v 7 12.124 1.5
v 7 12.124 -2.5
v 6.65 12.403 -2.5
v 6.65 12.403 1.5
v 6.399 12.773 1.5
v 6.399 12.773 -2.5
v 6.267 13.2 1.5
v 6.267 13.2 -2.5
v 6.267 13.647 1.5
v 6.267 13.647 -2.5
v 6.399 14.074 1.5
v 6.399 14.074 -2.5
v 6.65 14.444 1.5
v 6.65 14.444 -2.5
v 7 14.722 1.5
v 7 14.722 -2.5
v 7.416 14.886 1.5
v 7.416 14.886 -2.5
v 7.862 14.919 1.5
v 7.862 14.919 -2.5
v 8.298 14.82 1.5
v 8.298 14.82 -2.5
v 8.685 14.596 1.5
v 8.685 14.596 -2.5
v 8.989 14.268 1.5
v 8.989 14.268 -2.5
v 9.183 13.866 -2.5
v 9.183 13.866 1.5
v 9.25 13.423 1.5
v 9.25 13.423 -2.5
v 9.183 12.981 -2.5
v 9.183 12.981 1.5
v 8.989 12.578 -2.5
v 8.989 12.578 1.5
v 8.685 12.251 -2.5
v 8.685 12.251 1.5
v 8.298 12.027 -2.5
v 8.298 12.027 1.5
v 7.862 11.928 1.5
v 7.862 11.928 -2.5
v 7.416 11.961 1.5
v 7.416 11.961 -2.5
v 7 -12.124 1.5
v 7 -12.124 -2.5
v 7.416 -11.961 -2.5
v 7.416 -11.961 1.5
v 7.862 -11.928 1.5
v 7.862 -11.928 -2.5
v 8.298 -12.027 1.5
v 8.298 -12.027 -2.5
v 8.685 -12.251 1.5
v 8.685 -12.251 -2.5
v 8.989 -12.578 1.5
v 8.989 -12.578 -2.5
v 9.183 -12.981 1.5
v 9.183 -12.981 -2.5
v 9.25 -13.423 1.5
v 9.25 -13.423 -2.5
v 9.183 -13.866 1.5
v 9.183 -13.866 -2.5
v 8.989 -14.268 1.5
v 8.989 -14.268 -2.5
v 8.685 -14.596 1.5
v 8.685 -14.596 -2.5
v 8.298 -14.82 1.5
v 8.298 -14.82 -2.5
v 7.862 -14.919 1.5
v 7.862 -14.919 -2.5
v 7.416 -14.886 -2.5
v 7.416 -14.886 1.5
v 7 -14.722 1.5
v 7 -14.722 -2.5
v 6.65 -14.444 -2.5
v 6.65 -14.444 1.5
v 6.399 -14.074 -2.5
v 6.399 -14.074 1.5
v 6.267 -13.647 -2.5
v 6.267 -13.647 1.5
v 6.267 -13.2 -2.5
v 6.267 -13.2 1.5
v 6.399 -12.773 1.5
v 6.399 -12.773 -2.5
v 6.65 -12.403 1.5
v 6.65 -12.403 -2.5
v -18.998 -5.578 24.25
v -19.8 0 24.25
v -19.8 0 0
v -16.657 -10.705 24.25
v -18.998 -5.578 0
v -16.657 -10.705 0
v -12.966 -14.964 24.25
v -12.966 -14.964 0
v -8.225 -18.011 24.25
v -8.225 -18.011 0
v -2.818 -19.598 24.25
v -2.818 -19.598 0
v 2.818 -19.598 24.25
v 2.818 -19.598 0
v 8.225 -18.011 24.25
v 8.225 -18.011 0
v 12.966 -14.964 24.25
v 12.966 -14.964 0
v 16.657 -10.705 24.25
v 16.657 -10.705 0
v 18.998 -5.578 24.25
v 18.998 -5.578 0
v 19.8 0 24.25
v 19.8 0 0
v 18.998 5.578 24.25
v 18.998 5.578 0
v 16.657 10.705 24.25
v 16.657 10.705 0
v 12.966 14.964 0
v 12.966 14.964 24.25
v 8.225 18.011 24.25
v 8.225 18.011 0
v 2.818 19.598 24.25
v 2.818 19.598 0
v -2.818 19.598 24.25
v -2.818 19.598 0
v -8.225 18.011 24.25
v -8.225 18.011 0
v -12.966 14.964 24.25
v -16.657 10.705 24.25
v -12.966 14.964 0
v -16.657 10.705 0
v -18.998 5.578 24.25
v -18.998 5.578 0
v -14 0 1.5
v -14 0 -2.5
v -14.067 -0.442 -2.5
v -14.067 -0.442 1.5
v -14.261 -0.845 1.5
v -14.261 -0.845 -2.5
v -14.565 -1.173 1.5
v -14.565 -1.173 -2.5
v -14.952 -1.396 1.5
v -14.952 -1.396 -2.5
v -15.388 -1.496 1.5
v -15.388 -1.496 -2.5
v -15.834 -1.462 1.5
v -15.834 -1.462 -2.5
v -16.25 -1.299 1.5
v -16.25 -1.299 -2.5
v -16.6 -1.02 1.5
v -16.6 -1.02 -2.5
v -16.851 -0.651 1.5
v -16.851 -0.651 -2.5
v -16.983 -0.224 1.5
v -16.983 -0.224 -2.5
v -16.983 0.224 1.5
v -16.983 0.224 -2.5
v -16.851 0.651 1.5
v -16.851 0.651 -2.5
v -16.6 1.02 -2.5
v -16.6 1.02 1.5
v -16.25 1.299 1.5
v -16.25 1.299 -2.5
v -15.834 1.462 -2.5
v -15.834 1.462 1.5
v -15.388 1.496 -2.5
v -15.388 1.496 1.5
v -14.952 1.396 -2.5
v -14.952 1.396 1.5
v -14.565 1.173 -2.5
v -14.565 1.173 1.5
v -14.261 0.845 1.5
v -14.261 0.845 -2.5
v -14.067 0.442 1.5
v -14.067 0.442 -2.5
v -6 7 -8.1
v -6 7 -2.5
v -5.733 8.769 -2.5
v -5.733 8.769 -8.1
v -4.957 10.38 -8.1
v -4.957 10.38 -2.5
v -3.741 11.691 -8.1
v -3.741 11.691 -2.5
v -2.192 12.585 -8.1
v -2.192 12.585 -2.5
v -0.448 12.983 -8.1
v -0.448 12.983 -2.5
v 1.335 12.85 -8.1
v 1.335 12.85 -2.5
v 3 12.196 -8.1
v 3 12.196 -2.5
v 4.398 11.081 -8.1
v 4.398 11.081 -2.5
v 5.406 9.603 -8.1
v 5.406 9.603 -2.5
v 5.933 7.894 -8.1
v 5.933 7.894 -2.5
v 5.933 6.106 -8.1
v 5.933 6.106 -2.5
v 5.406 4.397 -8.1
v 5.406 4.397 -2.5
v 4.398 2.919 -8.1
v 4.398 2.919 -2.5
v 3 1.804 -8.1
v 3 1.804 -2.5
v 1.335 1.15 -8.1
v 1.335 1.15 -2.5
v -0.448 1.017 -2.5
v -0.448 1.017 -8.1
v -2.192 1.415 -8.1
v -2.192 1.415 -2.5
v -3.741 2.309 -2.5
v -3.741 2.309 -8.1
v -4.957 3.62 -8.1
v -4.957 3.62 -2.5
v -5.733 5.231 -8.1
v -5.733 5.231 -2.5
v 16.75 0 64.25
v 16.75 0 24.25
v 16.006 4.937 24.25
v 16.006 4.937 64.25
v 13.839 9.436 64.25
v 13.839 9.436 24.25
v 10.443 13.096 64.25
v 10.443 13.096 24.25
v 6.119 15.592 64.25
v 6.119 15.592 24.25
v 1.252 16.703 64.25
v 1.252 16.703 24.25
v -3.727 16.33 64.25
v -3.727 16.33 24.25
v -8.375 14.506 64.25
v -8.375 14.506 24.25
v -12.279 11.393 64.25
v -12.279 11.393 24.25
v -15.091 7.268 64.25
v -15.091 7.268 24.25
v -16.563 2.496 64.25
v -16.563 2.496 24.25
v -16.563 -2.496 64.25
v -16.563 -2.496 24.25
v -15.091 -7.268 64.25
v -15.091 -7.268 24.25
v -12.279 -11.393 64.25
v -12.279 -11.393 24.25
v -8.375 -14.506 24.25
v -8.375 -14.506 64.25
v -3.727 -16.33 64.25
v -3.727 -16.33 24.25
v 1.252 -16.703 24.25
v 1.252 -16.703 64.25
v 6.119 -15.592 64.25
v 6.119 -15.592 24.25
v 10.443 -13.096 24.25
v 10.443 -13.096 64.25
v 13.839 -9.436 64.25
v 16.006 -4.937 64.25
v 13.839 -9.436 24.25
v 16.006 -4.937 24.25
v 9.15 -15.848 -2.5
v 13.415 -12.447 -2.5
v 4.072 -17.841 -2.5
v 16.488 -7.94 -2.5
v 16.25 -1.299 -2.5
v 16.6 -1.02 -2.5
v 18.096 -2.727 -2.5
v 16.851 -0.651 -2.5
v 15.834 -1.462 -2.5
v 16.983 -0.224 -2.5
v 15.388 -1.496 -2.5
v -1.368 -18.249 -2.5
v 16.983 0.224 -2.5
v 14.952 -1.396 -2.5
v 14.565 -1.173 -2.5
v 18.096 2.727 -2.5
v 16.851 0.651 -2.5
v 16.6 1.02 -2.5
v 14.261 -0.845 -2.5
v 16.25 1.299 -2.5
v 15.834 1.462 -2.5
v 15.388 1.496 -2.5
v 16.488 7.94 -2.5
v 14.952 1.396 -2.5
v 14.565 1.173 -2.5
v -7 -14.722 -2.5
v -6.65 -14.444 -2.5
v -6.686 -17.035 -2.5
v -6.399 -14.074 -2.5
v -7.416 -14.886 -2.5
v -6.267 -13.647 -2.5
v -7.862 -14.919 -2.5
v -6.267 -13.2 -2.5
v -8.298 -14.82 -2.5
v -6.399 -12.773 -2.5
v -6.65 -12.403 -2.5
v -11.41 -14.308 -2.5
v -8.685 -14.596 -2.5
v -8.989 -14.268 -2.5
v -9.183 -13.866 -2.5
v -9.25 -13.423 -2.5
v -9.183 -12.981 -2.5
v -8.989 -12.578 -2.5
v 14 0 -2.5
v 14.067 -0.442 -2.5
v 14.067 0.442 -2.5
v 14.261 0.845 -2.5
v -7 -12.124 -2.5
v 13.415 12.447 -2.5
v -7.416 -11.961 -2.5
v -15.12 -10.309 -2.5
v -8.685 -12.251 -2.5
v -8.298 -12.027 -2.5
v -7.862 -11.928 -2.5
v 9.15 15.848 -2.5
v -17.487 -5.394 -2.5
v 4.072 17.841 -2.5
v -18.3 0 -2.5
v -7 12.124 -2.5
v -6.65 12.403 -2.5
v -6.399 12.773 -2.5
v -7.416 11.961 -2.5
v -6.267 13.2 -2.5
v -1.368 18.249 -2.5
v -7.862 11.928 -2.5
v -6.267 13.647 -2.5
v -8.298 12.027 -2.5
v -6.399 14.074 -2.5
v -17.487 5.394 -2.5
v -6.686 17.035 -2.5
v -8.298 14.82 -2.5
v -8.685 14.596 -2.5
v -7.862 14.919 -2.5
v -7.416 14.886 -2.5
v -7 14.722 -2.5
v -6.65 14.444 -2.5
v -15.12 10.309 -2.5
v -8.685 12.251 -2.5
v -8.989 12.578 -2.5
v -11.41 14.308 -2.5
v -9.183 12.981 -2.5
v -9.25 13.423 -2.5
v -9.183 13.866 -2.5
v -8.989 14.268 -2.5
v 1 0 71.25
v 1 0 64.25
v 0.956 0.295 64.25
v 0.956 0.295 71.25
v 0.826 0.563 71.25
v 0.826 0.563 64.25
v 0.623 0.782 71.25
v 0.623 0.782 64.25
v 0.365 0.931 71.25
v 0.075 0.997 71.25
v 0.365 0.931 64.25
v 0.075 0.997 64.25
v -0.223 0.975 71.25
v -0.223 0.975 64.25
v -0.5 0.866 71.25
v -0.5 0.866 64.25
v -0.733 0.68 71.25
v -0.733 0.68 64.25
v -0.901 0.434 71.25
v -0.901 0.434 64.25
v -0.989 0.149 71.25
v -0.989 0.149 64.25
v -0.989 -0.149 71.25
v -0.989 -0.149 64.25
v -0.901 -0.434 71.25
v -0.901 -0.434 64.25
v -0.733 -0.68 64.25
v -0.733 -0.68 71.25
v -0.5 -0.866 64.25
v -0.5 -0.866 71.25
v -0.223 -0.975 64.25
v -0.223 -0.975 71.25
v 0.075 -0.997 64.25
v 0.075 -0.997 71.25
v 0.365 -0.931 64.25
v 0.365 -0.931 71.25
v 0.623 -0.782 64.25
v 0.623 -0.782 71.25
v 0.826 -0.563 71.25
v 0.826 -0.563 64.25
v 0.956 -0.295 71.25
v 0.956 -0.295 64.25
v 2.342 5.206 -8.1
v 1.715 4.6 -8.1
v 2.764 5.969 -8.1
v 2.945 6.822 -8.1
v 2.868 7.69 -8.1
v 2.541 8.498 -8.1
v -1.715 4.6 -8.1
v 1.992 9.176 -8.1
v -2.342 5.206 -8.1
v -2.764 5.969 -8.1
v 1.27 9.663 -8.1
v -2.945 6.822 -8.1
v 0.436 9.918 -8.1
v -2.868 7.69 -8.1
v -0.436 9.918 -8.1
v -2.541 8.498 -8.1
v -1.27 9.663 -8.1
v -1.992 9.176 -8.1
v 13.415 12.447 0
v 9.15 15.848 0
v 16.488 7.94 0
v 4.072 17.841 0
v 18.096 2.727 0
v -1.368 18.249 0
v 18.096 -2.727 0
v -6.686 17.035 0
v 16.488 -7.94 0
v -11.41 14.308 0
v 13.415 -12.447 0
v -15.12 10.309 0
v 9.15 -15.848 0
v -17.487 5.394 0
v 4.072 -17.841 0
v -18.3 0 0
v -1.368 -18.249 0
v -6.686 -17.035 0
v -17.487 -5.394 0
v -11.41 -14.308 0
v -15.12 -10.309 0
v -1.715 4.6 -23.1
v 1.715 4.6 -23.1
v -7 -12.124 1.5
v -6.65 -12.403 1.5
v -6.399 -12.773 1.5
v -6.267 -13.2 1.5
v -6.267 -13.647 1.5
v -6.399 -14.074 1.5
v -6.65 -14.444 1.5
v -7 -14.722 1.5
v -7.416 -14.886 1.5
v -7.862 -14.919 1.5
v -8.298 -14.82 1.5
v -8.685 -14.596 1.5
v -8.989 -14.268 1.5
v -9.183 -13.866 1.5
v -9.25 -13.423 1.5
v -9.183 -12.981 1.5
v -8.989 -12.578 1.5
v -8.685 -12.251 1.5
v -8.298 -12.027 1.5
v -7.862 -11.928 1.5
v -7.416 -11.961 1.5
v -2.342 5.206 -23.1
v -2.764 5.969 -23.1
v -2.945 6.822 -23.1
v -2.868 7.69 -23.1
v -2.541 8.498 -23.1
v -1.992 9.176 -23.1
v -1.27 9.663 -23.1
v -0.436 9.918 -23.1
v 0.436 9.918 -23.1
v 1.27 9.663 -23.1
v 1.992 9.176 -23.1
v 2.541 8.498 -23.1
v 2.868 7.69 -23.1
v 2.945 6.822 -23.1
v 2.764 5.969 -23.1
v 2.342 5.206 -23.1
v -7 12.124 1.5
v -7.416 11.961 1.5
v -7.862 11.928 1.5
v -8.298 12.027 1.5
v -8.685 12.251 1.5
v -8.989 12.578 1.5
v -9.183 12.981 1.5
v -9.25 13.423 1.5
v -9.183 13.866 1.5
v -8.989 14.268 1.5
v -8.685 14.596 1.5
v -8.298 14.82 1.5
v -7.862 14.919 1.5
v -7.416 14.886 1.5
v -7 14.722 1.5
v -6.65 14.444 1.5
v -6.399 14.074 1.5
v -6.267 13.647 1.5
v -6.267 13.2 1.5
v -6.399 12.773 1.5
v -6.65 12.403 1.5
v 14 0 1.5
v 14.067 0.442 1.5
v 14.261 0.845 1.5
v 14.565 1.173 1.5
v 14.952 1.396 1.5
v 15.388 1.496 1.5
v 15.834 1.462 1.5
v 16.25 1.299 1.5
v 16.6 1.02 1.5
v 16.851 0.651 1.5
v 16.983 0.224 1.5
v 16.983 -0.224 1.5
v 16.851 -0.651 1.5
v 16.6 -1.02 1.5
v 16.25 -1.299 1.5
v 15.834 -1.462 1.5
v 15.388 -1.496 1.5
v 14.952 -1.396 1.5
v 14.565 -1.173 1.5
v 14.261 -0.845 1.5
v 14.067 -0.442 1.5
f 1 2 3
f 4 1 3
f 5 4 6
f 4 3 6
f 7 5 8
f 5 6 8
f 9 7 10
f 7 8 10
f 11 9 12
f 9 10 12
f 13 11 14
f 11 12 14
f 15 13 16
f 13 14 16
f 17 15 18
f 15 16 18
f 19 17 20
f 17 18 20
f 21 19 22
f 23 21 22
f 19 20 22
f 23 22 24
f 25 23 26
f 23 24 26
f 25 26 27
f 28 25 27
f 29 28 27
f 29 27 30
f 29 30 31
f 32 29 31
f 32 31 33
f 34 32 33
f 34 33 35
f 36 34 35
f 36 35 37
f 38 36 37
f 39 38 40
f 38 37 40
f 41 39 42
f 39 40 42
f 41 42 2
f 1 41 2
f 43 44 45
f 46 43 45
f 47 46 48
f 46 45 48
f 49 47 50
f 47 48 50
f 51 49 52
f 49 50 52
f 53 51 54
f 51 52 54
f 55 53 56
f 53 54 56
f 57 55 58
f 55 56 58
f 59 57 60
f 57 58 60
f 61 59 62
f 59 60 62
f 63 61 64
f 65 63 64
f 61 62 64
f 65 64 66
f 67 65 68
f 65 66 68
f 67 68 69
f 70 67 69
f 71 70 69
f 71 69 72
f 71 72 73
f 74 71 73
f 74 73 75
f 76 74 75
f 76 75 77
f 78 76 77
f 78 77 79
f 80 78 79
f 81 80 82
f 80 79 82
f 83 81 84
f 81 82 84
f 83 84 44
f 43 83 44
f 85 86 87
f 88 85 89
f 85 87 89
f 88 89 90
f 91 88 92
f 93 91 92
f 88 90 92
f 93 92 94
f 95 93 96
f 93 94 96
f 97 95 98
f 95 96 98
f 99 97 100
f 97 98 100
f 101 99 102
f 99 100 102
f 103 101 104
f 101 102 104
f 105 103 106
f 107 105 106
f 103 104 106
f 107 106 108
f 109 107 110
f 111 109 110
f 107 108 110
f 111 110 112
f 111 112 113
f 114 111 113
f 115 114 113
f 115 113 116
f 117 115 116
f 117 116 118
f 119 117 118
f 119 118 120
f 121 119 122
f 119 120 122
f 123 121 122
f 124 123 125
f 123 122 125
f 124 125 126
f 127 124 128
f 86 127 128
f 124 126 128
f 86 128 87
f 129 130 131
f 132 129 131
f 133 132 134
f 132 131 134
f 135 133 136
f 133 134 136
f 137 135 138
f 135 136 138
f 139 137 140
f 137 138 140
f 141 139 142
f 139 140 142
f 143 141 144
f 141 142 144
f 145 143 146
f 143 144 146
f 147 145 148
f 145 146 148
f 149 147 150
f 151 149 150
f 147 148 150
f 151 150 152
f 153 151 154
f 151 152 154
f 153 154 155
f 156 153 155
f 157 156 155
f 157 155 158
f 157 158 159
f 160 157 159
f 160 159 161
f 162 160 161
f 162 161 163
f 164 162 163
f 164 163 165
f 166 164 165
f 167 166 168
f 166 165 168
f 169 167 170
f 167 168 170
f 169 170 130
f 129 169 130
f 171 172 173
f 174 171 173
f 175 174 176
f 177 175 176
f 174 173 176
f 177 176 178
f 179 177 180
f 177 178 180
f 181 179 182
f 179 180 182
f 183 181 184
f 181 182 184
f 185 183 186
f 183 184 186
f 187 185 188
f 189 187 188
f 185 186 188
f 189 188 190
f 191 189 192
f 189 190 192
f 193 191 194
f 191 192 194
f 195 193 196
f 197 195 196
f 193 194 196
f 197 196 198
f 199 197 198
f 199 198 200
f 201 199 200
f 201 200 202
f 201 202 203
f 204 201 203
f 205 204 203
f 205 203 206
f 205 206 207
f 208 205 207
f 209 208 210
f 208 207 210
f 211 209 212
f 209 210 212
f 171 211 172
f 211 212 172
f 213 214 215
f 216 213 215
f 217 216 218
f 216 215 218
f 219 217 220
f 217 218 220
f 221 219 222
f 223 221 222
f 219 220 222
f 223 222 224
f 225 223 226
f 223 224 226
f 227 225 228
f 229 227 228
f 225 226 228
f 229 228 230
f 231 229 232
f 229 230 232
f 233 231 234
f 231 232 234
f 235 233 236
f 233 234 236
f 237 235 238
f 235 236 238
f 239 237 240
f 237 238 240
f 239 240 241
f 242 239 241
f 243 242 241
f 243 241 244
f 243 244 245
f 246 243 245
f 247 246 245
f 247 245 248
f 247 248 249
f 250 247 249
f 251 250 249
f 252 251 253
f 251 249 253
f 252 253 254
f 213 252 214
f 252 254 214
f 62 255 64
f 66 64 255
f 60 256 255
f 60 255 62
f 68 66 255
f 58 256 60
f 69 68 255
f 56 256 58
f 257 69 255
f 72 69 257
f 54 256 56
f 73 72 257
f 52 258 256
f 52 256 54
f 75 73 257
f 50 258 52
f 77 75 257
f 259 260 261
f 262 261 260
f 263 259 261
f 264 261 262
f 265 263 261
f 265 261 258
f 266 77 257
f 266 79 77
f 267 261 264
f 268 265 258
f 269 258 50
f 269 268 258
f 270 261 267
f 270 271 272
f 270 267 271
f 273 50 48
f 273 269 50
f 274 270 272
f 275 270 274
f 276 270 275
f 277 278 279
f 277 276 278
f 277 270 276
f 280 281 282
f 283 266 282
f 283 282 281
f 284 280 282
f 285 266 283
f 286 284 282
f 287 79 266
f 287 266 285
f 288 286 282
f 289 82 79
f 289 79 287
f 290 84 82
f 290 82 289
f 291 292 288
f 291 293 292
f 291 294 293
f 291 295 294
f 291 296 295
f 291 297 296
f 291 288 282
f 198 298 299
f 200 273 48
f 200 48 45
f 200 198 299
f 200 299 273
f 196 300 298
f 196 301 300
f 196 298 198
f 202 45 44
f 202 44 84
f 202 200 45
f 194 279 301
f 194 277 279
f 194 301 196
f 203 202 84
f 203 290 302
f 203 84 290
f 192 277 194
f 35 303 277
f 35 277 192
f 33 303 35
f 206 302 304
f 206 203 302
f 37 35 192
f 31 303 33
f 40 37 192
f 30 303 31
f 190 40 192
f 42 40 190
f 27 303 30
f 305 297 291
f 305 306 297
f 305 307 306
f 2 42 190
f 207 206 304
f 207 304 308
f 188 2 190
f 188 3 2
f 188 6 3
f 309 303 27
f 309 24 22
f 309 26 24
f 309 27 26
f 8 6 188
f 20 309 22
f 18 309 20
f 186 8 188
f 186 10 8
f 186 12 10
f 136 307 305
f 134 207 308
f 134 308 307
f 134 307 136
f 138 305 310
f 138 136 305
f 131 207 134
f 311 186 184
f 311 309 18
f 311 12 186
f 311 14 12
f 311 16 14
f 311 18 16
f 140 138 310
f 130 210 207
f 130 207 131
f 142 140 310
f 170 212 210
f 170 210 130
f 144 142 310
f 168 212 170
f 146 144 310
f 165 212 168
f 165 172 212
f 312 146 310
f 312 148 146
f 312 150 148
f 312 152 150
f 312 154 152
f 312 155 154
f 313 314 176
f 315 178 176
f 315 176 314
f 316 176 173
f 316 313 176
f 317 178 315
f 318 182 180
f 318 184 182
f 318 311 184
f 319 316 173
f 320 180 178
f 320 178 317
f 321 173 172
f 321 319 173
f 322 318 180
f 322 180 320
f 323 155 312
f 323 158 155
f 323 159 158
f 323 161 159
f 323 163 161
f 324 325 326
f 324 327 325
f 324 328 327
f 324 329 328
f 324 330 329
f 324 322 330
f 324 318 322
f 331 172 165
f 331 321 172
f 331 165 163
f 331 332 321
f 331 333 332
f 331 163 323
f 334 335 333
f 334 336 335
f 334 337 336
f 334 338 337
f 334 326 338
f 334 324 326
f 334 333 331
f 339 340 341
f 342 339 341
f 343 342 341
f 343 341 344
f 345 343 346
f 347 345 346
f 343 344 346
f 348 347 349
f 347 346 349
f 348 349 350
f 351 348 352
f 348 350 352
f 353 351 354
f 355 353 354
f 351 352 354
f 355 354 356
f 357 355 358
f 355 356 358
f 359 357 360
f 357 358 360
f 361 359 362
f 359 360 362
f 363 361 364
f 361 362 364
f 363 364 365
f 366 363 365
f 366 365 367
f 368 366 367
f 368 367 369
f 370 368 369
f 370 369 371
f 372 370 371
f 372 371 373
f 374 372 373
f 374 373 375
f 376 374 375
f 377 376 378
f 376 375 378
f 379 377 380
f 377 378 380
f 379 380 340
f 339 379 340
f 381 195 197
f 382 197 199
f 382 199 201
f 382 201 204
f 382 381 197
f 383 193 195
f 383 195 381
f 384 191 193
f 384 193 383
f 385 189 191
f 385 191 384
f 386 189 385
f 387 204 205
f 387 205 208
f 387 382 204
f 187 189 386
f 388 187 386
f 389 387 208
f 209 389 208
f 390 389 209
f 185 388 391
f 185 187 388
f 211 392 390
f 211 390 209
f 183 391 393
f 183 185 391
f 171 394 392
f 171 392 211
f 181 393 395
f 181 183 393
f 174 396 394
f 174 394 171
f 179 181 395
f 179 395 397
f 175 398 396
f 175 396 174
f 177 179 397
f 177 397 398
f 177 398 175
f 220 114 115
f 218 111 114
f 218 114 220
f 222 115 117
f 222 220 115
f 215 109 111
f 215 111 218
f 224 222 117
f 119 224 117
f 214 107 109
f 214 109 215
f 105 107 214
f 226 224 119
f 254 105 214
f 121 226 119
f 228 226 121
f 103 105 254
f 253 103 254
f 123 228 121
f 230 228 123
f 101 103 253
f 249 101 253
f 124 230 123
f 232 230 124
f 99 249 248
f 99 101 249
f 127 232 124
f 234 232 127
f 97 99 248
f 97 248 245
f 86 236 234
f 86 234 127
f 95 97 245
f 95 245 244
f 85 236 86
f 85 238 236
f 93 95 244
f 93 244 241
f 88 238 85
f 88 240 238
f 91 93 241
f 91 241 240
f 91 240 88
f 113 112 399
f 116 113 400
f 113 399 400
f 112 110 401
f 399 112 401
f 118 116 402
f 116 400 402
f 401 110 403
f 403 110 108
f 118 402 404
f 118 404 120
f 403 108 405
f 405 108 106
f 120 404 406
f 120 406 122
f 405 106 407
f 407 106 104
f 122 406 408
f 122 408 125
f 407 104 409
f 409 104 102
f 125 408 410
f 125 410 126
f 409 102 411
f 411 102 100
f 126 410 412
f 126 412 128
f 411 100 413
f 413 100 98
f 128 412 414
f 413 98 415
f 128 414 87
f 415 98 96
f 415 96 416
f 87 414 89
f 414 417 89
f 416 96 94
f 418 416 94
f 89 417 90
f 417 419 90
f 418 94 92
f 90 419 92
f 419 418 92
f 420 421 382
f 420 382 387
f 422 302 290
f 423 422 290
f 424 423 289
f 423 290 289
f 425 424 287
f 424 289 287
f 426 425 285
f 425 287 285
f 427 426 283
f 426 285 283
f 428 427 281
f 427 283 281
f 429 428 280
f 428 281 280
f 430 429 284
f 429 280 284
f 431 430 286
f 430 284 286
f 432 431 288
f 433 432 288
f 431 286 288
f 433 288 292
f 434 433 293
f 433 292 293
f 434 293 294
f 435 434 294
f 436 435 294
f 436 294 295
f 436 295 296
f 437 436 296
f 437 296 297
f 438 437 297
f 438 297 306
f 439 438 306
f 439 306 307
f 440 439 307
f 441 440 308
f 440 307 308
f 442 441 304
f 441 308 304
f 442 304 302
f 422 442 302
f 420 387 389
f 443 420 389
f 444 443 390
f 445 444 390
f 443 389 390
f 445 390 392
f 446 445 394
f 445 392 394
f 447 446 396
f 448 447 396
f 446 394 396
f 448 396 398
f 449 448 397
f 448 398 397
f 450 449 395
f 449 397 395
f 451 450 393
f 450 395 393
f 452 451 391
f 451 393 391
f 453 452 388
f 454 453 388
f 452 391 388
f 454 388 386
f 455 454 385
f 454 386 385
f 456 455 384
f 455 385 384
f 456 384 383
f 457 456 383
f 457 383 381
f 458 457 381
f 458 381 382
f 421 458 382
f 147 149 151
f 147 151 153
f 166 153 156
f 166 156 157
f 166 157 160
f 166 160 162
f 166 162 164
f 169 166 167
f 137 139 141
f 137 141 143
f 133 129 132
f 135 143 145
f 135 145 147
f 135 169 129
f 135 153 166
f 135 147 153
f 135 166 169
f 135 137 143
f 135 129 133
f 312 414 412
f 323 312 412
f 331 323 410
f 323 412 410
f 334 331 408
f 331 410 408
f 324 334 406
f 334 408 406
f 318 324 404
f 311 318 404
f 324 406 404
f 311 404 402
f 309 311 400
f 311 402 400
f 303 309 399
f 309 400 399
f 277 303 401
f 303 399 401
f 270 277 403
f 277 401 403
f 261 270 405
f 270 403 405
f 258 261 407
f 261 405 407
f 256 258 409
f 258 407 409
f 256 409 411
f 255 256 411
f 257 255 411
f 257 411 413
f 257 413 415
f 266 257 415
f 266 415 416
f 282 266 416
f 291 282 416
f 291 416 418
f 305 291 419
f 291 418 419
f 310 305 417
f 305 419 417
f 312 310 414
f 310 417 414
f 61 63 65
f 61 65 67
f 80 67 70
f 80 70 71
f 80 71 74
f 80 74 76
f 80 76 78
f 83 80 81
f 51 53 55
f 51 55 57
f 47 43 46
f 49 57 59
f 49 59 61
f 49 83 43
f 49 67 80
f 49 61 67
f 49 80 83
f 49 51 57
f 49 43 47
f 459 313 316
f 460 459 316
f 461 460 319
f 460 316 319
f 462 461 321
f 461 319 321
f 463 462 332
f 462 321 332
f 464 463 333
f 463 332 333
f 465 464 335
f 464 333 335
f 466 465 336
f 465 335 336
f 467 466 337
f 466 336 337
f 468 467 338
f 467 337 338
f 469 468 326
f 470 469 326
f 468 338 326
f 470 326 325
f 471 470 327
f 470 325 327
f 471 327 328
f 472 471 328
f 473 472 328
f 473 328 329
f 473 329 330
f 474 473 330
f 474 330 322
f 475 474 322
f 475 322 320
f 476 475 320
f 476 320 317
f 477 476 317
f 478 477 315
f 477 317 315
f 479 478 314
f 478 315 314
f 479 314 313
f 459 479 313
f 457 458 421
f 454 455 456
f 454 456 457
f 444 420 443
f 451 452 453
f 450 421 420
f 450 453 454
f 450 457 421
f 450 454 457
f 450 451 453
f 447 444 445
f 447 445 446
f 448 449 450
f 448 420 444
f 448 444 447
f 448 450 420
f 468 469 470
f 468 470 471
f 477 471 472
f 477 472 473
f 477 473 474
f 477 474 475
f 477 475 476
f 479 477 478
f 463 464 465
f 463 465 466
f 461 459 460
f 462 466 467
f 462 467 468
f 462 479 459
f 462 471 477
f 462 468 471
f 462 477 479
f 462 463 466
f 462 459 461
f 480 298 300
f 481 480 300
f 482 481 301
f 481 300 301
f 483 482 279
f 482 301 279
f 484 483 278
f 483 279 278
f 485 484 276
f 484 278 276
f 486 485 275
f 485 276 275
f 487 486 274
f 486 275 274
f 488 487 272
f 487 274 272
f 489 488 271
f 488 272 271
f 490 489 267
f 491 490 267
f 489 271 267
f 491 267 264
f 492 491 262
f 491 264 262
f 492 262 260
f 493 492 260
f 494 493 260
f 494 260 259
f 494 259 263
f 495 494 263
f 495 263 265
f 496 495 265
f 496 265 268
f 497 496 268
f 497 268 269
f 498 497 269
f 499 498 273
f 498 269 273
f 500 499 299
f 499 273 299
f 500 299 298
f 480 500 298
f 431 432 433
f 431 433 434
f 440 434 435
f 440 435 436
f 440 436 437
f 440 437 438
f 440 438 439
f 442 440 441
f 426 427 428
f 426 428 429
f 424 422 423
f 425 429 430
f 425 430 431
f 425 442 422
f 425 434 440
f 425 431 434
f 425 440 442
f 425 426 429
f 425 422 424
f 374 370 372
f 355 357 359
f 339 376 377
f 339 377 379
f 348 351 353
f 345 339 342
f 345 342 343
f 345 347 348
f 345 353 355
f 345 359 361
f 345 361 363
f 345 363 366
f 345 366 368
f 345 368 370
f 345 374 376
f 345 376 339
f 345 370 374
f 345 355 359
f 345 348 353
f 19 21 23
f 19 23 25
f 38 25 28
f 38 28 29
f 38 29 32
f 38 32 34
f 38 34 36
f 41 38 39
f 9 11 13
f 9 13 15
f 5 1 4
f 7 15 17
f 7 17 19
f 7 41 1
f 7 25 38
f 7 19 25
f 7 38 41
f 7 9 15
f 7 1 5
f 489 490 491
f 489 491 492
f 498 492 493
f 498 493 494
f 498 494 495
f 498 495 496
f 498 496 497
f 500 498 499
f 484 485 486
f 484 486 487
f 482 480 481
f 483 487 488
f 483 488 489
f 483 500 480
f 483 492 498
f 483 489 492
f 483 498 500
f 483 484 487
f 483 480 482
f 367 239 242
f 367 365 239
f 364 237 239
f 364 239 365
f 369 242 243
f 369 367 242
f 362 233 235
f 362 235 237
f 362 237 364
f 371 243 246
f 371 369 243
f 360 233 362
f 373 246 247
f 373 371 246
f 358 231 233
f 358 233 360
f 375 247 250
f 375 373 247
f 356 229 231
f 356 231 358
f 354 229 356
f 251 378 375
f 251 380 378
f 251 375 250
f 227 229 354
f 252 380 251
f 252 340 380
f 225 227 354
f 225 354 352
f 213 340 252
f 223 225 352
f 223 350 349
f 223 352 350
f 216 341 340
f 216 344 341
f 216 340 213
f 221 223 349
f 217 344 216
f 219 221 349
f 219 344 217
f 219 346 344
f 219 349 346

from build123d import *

# Parameters (mm, degrees)
SKETCH1_R            = 19.8
GEARBOX_DEPTH        = 24.25
SKETCH2_R            = 16.75
MOTOR_DEPTH          = 40
SKETCH3_R            = 18.3
GEARBOX_LIP_DEPTH    = 2.5
SKETCH4_R            = 6
SHAFT_HUB_DEPTH      = 5.6
SHAFT_DEPTH          = 15
SKETCH6_R            = 1.5
MNT_SCREW_HOLE_DEPTH = 4
CIRPATTERN1_COUNT    = 6
SKETCH7_R            = 1
SENSORSHAFT_DEPTH    = 7


with BuildPart() as part:
    # Sketch1 → gearbox (new body)
    with BuildSketch(Plane.XY):
        with Locations(Location((0, 0, 0), (0, 0, 180))):
            Circle(SKETCH1_R)
    extrude(amount=GEARBOX_DEPTH)

    # Sketch2 → motor (add)
    with BuildSketch(Plane.XY.offset(24.25)):
        Circle(SKETCH2_R)
    extrude(amount=MOTOR_DEPTH)

    # Sketch3 → gearbox lip (add)
    with BuildSketch(Plane(origin=(0, 0, 0), x_dir=(-1, 0, 0), z_dir=(0, 0, -1))):
        Circle(SKETCH3_R)
    extrude(amount=GEARBOX_LIP_DEPTH)

    # Sketch4 → shaft hub (add)
    with BuildSketch(Plane(origin=(0, 0, -2.5), x_dir=(-1, 0, 0), z_dir=(0, 0, -1))):
        with Locations((0, 7)):
            Circle(SKETCH4_R)
    extrude(amount=SHAFT_HUB_DEPTH)

    # Sketch5 → shaft (add)
    with BuildSketch(Plane(origin=(0, 0, -8.1), x_dir=(-1, 0, 0), z_dir=(0, 0, -1))):
        with BuildLine():
            Line((-1.71537168, 4.6), (1.71537168, 4.6))
            ThreePointArc((1.71537168, 4.6), (0, 9.95), (-1.71537168, 4.6))
        make_face()
    extrude(amount=SHAFT_DEPTH)

    # Sketch6 → mnt screw hole (cut)
    with BuildSketch(Plane(origin=(0, 0, -2.5), x_dir=(-1, 0, 0), z_dir=(0, 0, -1))):
        with Locations((-15.5, 0)):
            Circle(SKETCH6_R)
    mnt_screw_hole = extrude(amount=-MNT_SCREW_HOLE_DEPTH, mode=Mode.SUBTRACT)

    # CirPattern1: mnt screw hole ×6 about axis
    cirpattern1_axis = Axis((0, 0, 0), (0, 0, 1))
    for i in range(1, CIRPATTERN1_COUNT):
        add(mnt_screw_hole.rotate(cirpattern1_axis, i * 360 / CIRPATTERN1_COUNT), mode=Mode.SUBTRACT)

    # Sketch7 → sensorshaft (add)
    with BuildSketch(Plane.XY.offset(64.25)):
        Circle(SKETCH7_R)
    extrude(amount=SENSORSHAFT_DEPTH)


solid = part.part
